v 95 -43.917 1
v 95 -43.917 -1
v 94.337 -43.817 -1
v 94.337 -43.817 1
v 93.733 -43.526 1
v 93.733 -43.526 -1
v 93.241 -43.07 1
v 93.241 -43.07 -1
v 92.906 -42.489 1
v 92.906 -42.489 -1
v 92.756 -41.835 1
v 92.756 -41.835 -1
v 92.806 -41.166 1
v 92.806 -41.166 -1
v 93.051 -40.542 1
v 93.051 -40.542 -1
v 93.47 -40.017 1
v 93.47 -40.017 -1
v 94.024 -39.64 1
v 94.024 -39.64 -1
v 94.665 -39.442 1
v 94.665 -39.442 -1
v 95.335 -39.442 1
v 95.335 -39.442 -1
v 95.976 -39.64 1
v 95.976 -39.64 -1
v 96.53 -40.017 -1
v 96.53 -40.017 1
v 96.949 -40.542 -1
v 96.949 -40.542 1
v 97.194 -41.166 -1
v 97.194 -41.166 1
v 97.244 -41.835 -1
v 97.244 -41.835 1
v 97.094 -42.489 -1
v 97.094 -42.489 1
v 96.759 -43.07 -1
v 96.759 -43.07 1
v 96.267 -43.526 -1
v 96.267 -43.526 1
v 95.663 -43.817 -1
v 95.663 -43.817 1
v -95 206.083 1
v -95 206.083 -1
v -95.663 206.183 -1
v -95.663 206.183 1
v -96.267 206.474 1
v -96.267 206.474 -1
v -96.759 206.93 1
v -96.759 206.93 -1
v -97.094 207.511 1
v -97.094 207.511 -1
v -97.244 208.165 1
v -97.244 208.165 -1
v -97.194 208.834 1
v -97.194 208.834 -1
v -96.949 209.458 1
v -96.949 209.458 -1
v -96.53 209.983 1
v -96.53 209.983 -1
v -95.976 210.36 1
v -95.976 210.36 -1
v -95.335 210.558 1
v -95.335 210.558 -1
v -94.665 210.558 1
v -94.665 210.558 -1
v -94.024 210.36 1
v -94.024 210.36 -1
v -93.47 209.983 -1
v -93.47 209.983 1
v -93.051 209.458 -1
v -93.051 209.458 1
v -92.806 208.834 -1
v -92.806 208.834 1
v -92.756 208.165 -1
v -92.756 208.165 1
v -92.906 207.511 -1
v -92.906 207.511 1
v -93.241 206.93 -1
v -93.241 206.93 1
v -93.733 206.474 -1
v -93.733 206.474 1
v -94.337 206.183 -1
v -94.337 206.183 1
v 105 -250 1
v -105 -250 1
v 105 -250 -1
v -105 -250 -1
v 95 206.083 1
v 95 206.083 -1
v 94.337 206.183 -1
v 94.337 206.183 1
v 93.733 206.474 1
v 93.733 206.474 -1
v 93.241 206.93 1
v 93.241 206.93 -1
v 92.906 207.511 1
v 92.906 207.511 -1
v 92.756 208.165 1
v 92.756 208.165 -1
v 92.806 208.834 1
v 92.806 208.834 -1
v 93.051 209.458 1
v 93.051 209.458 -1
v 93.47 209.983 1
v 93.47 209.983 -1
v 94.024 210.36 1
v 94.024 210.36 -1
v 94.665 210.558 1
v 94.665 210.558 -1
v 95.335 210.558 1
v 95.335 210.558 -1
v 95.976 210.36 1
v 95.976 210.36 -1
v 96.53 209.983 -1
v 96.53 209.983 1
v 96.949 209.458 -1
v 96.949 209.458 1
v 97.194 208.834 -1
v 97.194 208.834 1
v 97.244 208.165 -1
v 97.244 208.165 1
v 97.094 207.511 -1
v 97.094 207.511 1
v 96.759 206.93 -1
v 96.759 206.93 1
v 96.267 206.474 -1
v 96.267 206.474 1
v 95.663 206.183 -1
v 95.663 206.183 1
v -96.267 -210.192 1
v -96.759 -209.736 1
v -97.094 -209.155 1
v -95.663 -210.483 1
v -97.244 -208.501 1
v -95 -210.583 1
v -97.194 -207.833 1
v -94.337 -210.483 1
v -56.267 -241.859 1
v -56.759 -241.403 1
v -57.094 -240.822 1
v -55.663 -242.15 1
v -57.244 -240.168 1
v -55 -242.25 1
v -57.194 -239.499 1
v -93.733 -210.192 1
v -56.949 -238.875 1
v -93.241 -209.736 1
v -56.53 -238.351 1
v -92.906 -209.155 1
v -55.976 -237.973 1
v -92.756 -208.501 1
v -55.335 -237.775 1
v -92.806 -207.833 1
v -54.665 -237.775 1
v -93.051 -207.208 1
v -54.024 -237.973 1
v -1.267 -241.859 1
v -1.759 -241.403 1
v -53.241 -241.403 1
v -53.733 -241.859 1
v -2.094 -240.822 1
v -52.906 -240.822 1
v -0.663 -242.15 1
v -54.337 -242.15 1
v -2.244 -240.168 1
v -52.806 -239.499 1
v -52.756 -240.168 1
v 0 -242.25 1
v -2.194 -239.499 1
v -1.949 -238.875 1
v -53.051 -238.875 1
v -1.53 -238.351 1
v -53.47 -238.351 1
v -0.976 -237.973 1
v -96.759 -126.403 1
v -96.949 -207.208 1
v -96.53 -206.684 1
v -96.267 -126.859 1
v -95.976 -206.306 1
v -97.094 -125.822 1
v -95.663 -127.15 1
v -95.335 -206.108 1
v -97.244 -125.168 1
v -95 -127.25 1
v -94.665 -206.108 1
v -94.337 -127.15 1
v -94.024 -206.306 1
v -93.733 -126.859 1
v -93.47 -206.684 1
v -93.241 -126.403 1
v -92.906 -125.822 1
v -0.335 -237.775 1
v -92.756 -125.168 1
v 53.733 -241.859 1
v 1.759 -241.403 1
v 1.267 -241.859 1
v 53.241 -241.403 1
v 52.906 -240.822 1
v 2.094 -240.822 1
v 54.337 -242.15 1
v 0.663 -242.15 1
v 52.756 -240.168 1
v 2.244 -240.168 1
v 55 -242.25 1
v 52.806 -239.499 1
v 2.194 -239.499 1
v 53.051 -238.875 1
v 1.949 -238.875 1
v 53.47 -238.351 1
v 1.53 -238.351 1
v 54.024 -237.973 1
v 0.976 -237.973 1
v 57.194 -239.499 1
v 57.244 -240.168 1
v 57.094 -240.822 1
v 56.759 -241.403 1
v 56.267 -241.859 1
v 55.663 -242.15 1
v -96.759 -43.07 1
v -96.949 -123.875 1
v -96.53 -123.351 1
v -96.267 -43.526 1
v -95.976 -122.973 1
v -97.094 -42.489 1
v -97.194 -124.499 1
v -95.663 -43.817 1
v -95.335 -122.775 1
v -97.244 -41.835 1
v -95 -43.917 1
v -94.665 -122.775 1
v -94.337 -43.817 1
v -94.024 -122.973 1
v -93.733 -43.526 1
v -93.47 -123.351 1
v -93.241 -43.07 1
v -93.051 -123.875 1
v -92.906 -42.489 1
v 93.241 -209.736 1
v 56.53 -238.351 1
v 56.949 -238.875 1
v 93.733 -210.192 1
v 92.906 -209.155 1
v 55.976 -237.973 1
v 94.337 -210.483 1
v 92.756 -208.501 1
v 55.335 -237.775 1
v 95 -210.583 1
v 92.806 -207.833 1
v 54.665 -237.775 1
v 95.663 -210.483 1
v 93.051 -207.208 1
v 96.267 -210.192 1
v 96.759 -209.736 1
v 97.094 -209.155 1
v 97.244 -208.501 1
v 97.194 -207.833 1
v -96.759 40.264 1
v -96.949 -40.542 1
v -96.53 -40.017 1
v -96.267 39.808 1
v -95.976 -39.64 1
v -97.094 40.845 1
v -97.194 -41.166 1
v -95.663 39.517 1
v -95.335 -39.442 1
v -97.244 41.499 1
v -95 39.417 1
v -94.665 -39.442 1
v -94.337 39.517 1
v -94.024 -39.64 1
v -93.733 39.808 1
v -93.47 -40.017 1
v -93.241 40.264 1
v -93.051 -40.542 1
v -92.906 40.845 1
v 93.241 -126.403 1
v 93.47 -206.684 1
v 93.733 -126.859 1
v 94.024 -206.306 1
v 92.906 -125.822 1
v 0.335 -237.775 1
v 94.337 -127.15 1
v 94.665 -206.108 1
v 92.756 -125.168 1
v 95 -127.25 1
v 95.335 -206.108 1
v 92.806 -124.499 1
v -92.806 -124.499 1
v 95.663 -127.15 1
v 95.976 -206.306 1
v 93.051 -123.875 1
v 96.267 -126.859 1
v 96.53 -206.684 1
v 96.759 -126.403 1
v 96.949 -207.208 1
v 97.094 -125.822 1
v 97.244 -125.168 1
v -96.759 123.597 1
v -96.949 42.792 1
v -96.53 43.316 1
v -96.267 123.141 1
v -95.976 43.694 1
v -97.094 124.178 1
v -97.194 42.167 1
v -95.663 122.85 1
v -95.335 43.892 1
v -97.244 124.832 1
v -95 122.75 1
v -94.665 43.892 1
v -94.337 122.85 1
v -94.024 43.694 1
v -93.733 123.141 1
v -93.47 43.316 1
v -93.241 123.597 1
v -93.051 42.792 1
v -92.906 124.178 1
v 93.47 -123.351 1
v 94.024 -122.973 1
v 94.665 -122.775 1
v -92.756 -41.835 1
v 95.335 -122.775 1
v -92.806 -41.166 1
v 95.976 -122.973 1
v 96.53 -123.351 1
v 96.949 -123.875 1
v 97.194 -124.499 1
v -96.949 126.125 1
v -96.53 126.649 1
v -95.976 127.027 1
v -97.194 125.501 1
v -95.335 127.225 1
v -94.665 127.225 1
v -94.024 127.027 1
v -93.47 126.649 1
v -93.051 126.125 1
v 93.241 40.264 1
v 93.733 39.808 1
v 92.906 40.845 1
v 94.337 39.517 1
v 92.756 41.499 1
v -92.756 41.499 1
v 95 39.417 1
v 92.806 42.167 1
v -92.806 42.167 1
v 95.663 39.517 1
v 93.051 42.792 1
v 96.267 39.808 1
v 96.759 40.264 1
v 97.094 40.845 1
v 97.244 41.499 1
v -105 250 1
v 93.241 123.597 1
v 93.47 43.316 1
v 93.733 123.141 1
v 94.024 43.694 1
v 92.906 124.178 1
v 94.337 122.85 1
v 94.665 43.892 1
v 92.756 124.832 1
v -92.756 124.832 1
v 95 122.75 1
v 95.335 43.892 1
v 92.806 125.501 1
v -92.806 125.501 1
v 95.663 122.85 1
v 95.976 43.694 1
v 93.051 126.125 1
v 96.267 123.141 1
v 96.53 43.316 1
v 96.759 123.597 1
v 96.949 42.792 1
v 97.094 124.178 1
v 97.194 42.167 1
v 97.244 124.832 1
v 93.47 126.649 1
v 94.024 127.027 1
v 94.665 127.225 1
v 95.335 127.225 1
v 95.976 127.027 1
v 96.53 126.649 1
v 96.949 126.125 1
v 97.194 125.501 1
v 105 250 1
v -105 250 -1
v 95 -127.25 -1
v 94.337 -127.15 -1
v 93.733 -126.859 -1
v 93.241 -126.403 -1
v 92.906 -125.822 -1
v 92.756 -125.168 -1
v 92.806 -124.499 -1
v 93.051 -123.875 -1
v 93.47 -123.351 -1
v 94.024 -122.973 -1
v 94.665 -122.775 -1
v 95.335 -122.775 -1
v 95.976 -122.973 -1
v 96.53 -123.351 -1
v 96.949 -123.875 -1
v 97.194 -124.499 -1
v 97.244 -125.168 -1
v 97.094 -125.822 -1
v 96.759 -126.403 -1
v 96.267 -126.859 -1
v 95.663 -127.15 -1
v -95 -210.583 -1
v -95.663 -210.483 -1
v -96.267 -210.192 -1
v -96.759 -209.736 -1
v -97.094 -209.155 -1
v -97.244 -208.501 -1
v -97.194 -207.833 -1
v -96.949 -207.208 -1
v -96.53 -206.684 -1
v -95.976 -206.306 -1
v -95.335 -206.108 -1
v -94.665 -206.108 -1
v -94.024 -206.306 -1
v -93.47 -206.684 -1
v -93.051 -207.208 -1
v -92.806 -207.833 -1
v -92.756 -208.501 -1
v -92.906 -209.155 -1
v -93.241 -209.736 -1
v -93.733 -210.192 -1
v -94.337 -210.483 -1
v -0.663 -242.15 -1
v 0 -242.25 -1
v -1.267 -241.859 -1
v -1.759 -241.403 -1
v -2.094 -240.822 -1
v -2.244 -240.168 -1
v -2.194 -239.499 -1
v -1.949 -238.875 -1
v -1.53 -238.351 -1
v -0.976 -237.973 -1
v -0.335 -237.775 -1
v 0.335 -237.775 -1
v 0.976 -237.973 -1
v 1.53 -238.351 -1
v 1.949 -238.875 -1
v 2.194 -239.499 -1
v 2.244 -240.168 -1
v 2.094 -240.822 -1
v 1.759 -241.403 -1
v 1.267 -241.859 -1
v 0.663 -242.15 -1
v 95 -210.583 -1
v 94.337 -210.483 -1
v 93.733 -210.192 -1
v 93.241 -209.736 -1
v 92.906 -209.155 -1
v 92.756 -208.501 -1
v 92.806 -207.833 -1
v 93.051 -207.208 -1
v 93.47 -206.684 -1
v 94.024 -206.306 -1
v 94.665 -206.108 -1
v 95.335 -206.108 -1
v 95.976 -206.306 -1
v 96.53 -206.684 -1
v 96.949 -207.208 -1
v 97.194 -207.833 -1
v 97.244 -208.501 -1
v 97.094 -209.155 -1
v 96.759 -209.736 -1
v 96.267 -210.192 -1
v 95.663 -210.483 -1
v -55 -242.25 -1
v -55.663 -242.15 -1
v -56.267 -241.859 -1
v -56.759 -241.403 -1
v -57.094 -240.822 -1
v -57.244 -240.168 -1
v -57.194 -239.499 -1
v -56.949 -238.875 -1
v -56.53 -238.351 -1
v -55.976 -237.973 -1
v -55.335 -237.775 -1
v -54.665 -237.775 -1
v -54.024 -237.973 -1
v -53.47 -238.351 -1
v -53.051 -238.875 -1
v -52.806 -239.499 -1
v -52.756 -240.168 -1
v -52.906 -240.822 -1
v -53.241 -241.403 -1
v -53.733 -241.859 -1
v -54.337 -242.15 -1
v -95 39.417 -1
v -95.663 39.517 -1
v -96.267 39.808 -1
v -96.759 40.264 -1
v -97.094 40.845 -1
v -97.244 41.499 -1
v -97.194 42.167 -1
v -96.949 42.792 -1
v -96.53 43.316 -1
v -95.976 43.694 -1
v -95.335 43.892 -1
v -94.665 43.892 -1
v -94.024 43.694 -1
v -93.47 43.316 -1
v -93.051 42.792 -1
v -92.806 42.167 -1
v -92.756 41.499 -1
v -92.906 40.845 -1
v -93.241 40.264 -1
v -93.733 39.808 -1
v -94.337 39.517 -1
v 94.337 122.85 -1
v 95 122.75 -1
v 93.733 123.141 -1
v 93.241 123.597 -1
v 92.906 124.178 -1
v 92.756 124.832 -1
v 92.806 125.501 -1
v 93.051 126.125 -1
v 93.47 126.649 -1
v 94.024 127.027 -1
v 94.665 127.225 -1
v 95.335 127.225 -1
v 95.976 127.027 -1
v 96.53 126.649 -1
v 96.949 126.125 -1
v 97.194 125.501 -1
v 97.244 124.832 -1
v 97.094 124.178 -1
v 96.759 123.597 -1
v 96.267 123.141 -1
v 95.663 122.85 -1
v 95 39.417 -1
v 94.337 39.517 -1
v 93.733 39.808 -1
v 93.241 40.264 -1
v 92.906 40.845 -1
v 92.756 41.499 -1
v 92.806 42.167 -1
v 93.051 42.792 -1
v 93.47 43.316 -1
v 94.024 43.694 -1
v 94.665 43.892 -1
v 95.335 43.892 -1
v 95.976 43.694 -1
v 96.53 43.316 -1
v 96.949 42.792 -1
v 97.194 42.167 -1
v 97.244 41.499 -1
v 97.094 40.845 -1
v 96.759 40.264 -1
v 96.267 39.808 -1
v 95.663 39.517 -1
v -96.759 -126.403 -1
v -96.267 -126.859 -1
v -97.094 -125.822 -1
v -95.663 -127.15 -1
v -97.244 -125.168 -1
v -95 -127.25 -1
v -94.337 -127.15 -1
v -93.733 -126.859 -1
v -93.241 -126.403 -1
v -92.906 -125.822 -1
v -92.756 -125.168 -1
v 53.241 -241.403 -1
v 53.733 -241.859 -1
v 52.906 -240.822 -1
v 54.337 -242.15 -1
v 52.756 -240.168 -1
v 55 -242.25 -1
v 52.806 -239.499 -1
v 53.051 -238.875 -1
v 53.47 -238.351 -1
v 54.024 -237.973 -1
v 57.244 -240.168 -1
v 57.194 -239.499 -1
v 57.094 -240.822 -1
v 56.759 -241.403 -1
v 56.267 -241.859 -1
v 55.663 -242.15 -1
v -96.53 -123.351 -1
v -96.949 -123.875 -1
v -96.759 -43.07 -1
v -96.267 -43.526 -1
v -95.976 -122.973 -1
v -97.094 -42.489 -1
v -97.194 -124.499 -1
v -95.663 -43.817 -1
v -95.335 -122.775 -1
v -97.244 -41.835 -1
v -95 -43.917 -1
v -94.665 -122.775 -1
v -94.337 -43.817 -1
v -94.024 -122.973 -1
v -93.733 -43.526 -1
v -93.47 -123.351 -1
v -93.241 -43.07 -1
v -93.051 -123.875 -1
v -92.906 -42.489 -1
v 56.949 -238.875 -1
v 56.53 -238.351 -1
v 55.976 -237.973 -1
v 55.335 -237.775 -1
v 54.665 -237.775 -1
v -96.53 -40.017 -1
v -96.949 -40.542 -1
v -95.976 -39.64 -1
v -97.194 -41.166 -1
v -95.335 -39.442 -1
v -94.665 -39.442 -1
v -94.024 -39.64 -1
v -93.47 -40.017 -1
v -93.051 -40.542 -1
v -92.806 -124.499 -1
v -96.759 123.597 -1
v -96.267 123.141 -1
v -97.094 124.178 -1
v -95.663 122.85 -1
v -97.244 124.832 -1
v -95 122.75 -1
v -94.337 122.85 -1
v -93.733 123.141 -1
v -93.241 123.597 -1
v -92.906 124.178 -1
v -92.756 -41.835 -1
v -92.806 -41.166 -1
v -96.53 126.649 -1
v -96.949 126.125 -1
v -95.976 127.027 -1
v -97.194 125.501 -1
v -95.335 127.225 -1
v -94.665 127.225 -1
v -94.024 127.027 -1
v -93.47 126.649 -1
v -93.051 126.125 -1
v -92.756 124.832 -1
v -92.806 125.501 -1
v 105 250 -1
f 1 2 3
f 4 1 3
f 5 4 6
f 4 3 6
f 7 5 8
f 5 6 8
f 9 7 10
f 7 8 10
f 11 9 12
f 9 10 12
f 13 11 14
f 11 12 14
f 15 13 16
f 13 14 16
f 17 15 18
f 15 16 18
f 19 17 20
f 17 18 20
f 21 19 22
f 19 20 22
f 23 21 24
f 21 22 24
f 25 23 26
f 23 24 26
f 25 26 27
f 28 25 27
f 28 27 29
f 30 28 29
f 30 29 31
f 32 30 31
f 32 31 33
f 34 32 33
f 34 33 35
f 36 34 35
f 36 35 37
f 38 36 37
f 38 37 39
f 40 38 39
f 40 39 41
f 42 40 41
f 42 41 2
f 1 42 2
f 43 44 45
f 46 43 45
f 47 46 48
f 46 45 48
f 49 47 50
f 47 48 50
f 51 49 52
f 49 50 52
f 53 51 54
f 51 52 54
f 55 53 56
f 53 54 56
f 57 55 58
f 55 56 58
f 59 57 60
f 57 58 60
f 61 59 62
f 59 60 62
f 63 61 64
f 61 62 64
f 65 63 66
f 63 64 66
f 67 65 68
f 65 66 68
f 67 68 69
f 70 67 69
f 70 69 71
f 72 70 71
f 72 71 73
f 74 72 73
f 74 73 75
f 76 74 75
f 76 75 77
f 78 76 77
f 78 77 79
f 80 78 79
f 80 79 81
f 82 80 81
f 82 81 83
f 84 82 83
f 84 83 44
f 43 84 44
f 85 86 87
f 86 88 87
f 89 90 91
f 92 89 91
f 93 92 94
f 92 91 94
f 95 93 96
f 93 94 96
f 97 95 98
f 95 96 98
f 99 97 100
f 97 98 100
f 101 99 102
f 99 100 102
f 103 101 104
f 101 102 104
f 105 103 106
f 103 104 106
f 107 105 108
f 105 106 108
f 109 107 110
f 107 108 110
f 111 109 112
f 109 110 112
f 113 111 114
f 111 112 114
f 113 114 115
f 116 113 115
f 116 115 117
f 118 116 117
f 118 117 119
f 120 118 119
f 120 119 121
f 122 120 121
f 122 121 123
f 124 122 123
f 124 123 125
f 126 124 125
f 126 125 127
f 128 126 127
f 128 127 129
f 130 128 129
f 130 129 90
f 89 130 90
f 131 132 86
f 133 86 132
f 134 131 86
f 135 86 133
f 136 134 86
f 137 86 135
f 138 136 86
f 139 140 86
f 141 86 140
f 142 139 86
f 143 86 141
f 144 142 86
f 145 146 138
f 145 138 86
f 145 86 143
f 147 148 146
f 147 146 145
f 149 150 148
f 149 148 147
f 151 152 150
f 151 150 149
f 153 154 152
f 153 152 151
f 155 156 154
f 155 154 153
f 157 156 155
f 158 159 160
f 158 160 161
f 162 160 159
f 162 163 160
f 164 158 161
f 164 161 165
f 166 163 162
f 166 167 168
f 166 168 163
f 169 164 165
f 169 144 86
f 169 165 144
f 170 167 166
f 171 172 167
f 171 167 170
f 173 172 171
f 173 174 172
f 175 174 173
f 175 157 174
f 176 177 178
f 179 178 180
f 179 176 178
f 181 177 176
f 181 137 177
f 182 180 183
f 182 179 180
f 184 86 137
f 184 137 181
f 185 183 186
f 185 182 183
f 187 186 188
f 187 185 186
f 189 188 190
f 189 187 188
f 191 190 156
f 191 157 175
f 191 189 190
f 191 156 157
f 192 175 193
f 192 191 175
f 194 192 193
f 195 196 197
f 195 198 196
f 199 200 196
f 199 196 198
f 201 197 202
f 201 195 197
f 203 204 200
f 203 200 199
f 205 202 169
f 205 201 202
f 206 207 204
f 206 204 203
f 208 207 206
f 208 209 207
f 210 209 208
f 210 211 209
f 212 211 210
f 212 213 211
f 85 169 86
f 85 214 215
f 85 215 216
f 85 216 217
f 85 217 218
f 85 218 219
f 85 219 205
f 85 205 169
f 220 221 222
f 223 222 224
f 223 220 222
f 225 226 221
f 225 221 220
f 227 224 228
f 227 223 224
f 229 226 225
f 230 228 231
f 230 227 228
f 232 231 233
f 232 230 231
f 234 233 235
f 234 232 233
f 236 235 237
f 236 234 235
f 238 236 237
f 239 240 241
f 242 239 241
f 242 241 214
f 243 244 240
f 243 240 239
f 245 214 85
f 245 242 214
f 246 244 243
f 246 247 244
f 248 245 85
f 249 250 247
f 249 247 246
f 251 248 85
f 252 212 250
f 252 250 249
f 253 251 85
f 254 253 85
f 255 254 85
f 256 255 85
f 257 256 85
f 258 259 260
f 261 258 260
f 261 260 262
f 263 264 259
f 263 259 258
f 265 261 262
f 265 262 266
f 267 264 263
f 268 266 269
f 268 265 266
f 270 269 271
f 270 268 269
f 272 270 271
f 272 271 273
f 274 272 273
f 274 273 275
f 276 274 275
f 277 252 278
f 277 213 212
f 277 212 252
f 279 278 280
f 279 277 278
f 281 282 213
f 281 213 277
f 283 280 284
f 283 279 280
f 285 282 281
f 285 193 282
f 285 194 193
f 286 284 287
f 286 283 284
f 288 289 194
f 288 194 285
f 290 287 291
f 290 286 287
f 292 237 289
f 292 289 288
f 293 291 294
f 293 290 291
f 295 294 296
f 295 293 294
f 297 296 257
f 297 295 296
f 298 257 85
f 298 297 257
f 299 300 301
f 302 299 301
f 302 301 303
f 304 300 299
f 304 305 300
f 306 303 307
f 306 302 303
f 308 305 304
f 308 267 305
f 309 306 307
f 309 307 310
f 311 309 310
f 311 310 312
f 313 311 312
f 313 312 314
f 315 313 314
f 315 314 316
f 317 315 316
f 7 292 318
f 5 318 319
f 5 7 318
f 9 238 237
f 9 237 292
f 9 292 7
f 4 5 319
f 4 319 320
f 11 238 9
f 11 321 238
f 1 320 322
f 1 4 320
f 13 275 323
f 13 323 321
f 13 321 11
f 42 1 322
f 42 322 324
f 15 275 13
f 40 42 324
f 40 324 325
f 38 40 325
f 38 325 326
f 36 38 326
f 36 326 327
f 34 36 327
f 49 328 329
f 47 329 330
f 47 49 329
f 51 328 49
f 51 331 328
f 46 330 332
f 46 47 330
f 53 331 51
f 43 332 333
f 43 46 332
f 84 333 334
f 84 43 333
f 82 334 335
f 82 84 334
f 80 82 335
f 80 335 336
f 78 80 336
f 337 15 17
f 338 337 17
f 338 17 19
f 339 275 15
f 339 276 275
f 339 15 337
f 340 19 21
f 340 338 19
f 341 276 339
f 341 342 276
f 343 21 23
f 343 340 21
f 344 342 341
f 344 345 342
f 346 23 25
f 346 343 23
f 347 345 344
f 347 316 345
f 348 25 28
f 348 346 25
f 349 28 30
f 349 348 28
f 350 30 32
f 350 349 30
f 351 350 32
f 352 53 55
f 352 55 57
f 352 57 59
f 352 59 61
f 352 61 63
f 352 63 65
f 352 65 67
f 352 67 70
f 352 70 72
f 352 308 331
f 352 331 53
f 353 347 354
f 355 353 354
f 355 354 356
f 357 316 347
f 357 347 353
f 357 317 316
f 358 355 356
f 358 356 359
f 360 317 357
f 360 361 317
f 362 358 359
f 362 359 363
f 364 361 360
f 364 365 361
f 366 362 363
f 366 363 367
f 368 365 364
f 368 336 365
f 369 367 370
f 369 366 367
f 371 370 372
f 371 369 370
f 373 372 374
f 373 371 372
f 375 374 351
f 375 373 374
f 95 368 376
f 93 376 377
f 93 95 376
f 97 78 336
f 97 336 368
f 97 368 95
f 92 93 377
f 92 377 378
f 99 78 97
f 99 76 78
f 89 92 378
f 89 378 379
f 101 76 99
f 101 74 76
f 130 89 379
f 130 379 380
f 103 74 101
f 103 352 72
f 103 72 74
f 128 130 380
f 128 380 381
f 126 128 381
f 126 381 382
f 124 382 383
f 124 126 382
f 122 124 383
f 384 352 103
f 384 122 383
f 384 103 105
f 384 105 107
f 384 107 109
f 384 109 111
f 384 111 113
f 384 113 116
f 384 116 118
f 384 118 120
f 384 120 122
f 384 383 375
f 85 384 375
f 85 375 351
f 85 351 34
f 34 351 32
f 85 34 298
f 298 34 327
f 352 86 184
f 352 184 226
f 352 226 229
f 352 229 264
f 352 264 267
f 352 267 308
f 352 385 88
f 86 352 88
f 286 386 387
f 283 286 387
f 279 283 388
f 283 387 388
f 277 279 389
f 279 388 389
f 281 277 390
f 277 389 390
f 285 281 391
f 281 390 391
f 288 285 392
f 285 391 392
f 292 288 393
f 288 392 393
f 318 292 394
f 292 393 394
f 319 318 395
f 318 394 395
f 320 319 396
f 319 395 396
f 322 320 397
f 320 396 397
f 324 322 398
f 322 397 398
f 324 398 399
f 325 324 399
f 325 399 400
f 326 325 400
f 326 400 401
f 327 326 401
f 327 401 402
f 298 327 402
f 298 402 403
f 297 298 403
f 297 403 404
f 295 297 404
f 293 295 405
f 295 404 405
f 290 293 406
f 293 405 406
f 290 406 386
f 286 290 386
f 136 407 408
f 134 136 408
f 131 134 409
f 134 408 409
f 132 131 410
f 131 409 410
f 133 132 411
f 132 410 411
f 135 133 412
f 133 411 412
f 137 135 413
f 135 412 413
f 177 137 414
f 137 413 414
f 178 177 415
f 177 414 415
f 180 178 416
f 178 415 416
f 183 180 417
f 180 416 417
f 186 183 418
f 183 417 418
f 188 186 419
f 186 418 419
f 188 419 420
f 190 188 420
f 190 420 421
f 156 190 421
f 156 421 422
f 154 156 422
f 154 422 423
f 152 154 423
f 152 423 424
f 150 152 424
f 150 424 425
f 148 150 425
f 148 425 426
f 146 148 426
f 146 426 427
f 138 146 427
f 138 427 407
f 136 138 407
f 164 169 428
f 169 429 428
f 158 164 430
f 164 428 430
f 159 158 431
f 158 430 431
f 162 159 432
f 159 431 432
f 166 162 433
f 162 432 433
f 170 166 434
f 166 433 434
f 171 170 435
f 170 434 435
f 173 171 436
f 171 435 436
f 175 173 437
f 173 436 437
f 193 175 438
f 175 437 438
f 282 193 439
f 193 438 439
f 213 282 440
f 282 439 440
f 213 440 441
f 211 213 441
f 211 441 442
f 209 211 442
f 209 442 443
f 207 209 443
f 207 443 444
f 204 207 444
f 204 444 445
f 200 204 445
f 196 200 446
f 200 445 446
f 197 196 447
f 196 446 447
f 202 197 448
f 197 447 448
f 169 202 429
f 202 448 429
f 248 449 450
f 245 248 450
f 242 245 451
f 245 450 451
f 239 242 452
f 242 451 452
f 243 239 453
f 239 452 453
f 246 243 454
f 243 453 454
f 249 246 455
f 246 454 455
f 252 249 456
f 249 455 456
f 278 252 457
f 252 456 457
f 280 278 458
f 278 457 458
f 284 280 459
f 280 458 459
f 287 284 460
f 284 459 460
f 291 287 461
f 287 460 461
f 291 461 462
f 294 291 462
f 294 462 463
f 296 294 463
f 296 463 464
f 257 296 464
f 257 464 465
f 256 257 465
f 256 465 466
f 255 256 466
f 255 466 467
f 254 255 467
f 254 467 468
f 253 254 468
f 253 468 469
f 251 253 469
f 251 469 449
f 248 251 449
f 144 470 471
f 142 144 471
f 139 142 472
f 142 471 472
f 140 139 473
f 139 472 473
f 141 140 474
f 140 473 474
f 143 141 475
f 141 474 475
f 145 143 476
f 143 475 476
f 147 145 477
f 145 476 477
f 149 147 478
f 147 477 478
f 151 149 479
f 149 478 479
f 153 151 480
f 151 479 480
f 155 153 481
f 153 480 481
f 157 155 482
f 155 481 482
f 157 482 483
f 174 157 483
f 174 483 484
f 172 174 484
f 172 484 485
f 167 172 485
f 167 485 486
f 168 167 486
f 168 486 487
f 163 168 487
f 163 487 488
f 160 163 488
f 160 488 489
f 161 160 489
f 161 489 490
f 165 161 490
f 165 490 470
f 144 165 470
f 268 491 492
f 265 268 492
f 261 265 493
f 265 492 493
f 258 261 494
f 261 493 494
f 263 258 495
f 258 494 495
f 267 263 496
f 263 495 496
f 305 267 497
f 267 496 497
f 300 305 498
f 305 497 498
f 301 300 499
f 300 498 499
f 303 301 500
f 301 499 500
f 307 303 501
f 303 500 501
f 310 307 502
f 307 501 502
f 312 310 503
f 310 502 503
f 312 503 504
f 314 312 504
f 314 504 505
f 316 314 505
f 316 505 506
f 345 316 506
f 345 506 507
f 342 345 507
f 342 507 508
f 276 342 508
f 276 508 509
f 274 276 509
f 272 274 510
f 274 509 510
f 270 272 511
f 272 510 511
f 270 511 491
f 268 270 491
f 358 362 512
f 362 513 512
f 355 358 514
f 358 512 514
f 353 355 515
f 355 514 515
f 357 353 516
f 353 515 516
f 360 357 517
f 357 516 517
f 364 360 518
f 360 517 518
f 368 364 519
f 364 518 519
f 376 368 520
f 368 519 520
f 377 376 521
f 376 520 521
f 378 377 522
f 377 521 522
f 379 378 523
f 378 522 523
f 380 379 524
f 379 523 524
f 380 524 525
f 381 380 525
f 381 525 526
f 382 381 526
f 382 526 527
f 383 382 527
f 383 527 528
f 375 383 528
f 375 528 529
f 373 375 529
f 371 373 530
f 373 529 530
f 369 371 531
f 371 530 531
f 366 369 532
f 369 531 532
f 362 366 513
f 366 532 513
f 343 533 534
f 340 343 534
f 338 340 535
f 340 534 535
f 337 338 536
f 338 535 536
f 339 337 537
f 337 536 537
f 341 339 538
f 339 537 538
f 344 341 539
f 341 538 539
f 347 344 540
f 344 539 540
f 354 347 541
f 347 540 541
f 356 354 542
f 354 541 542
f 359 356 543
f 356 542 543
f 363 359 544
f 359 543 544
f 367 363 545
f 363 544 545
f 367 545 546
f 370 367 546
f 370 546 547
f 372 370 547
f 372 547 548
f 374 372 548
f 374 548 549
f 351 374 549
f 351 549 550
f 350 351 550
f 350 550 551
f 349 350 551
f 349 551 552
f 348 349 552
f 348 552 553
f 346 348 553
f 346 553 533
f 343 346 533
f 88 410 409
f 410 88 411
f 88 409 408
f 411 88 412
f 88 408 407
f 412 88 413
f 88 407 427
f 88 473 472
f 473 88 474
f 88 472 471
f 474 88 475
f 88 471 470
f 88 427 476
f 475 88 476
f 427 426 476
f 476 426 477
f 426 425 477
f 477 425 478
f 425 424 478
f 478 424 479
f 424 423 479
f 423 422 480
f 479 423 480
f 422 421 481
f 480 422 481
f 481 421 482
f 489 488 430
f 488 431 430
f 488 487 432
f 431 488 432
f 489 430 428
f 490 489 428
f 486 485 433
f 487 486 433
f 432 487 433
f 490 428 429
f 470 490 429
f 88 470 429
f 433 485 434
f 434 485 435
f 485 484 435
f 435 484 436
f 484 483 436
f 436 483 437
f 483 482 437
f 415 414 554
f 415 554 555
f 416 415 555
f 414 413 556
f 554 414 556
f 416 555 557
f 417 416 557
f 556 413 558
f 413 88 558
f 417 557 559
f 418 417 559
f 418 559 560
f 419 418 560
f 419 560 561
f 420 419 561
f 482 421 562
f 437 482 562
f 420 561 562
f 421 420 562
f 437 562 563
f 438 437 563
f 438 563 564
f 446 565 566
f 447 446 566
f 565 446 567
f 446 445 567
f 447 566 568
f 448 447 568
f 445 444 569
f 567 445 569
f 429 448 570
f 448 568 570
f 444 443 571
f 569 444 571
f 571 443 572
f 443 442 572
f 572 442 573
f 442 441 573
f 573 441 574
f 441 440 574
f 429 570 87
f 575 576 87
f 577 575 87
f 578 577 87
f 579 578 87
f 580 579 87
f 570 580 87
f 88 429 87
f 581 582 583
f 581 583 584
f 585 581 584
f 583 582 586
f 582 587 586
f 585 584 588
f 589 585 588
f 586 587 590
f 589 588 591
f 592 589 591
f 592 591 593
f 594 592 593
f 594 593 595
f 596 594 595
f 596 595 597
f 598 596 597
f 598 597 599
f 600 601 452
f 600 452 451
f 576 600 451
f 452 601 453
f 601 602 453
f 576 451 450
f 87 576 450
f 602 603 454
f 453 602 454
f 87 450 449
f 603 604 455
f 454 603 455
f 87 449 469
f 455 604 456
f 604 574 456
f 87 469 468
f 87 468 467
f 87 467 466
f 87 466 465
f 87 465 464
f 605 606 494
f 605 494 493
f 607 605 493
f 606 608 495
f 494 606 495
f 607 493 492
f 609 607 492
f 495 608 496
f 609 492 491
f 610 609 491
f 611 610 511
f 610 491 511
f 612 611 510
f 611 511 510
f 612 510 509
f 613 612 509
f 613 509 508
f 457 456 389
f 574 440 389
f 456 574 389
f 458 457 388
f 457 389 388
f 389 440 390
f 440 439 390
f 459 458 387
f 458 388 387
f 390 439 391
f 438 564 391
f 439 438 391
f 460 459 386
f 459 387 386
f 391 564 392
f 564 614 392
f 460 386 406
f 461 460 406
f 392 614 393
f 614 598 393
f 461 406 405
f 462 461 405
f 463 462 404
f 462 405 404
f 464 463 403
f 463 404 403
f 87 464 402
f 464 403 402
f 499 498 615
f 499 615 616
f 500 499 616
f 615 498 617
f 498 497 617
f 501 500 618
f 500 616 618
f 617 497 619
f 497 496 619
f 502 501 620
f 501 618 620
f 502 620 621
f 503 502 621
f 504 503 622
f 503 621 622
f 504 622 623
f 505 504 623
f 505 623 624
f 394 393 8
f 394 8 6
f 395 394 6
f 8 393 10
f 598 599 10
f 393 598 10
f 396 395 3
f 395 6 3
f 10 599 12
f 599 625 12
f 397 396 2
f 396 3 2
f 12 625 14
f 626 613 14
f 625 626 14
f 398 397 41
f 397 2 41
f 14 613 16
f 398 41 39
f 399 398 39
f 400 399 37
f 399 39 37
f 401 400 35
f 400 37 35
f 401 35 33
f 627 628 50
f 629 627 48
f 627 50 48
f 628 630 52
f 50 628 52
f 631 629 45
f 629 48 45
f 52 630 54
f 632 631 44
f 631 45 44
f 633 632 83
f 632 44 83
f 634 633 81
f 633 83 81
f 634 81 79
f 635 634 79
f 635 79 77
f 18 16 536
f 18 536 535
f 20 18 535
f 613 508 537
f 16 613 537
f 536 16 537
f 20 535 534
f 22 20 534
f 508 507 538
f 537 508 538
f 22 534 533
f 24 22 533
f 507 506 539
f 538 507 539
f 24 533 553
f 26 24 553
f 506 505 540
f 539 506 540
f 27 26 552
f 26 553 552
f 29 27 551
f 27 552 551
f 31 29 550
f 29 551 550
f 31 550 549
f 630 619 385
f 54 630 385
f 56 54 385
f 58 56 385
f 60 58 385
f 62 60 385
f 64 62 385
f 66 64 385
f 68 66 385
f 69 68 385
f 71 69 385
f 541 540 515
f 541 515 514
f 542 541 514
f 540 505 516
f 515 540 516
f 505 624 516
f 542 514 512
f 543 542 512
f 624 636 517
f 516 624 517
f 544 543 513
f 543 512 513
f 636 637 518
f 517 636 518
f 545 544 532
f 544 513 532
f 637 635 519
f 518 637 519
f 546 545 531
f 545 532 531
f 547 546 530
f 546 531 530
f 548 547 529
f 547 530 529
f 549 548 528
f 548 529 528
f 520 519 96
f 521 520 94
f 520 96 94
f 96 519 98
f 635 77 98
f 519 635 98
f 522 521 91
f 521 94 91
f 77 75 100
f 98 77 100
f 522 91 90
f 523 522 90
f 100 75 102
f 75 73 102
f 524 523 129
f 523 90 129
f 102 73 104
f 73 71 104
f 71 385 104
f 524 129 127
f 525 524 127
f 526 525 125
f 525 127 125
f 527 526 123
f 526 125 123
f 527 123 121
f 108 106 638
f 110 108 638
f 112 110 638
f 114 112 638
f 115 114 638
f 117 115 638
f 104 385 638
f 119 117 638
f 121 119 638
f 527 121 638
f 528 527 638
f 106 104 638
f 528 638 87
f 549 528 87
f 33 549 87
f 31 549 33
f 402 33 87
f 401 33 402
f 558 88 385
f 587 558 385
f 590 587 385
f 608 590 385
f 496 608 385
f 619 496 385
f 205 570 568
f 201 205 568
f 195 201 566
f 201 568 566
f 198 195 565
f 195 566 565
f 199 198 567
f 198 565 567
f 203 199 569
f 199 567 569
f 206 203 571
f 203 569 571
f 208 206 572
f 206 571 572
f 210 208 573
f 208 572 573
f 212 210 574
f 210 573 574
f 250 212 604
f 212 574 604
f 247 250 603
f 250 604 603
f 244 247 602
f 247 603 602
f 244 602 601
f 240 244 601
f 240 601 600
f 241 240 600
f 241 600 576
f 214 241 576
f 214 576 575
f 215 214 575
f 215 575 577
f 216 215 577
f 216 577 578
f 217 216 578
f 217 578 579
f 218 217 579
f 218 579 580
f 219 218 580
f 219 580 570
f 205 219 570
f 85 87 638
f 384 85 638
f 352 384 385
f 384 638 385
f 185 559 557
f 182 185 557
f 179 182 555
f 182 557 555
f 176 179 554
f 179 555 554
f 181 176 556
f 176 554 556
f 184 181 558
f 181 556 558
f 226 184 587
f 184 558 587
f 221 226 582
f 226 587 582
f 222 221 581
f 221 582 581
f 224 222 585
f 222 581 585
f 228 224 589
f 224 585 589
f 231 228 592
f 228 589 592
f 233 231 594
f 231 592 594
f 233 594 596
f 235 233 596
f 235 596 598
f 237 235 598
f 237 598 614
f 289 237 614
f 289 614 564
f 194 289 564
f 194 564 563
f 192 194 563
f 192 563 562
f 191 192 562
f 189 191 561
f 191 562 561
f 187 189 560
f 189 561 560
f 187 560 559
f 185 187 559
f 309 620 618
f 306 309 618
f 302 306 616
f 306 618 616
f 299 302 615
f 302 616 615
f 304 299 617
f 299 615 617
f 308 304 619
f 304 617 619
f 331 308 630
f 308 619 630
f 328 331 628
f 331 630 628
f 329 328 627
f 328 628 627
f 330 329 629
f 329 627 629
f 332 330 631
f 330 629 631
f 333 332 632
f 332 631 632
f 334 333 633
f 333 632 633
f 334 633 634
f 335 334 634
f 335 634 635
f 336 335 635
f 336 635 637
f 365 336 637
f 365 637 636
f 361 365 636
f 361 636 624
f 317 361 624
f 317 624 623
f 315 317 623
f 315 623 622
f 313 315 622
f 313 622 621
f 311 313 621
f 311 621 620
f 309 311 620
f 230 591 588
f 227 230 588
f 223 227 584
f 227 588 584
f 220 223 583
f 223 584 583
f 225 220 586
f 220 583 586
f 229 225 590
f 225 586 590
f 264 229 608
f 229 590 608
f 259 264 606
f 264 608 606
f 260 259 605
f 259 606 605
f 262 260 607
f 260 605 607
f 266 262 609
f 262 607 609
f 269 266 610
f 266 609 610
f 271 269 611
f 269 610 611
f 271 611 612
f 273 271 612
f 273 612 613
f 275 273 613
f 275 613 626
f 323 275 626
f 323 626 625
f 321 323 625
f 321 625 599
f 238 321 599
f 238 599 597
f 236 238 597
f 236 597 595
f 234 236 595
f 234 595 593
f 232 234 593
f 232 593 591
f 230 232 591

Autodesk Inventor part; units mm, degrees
ref_plane "YZ Plane" through (0, 0, 0) normal (1, 0, 0) x (0, 1, 0)
ref_plane "XZ Plane" through (0, 0, 0) normal (0, 1, 0) x (-1, 0, 0)
ref_plane "XY Plane" through (0, 0, 0) normal (0, 0, 1) x (1, 0, 0)
sketch "Skizze1" plane through (0, 0, 0) normal (0, 0, 1) x (1, 0, 0)
  line L0 (-105, -250) -> (105, -250)
  line L1 (105, -250) -> (105, 250)
  line L2 (105, 250) -> (-105, 250)
  line L3 (-105, 250) -> (-105, -250)
  line L4 (-105, -250) -> (105, 250) construction
  line L5 (105, -250) -> (-105, 250) construction
  point P0 (0, 0)
  dimension "d0" = 500
  dimension "d1" = 210
extrude "Grundkörper" add sketch "Skizze1" along normal mid plane 2
sketch "Skizze2" plane through (0, 0, 1) normal (0, 0, 1) x (1, 0, 0)
  line L0 (-105, 250) -> (-105, -250) construction
  line L1 (0, 350) -> (0, -350) construction
  line L2 (-147, 0) -> (147, 0) construction
  line L3 (105, 250) -> (-105, 250) construction
  line L4 (-95, 250) -> (-95, -250) construction
  line L5 (-105, -250) -> (105, -250) construction
  line L6 (-95, -240) -> (105, -240) construction
  line L7 (105, -250) -> (105, 250) construction
  point P0 (0, 0)
  point P1 (-95, -208.3333)
  point P2 (-95, -125)
  point P3 (-95, -41.6667)
  point P4 (-95, 41.6667)
  point P5 (-95, 125)
  point P6 (-95, 208.3333)
  point P7 (95, -208.3333)
  point P8 (95, -125)
  point P9 (95, -41.6667)
  point P10 (95, 41.6667)
  point P11 (95, 125)
  point P12 (95, 208.3333)
  point P13 (0, -240)
  point P14 (55, -240)
  point P15 (-55, -240)
  dimension "d4" = 10
  dimension "d20" = 41.6667
  dimension "d23" = 83.3333
  dimension "d28" = 10
  dimension "d29" = 110
hole "M4_Boh" at (-95, -208.3333, 1) at (-95, -125, 1) at (-95, -41.6667, 1) at (-95, 41.6667, 1) at (-95, 125, 1) at (-95, 208.3333, 1) at (95, 208.3333, 1) at (95, 125, 1) at (95, 41.6667, 1) at (95, -41.6667, 1) at (95, -125, 1) at (95, -208.3333, 1) at (-55, -240, 1) at (0, -240, 1) at (55, -240, 1) direction (0, 0, -1) diameter 4.5 end through all
equation "\"d0\" = Chassis_Length"
equation "\"d20\" = 0.0833333 * Chassis_Length"
equation "\"d23\" = 0.166667 * Chassis_Length"
equation "\"d28\" = d4"
equation "\"d29\" = 0.5 * Chassis_Width"
equation "\"Chassis_Length\" = 500"
equation "\"Rocker_Screw_Distance\" = 32.5"
equation "\"Rocker_Screw_Distance_Bottom\" = 76"
equation "\"Chassis_Width\" = 220"
properties part number "100-10-FRAME-BOTTOM-PLATE" material "Edelstahl"
